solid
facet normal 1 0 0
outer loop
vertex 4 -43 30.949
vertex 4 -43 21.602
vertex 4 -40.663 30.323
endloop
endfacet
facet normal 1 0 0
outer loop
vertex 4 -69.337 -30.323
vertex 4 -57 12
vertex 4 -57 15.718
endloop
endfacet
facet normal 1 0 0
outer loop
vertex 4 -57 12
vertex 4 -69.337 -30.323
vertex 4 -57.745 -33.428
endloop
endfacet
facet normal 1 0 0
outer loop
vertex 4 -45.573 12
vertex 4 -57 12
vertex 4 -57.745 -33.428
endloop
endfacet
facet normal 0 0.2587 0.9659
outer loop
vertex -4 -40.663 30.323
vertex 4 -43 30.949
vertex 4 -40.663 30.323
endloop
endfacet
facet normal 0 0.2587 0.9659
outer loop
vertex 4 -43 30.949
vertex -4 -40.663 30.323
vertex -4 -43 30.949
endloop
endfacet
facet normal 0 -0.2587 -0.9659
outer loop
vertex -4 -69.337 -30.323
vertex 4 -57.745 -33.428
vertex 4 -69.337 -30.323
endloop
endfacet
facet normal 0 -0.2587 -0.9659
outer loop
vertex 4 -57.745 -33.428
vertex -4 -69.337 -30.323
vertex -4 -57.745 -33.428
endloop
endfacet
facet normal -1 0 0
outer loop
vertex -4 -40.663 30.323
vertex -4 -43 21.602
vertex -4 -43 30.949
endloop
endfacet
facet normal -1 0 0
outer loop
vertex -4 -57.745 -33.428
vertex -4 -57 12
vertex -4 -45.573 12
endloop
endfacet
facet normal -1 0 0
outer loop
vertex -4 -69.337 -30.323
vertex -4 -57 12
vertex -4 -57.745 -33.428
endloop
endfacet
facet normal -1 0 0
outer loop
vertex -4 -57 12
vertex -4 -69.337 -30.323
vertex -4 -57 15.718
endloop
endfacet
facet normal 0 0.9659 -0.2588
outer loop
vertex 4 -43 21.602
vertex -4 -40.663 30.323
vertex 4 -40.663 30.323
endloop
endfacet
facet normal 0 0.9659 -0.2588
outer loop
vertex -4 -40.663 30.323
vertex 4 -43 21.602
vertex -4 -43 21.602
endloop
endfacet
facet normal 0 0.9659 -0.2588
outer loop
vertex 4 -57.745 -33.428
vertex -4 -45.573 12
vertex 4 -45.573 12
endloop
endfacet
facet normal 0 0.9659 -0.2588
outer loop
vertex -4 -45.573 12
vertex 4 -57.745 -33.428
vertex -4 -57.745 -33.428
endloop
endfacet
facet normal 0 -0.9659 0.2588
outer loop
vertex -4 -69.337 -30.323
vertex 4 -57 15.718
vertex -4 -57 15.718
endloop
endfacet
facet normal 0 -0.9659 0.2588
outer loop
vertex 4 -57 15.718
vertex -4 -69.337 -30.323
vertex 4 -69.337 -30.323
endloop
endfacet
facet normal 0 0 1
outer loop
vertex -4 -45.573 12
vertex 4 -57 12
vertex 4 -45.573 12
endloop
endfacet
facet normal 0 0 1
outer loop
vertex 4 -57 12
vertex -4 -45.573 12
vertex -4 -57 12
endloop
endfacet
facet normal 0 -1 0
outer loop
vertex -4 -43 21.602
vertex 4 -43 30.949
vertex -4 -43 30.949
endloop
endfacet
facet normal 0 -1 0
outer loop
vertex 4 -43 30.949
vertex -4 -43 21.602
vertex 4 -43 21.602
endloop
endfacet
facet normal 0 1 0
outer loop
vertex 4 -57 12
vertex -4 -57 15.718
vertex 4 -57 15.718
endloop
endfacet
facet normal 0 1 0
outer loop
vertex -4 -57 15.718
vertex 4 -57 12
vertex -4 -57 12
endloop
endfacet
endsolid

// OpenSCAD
// Yin-Yang Phone Stand — DUAL COLOR
// File 1/2: Yin (dark) half — e.g. black PLA
// File 2/2: yinyang_yang.scad (light half)
// P2S Combo AMS: slot 1 = black, slot 2 = white
// 0.2mm, 4 walls, 20% infill, no supports

D        = 110;   // Disc diameter
THICK    = 12;    // Stand thickness
ANGLE    = 75;    // Phone lean angle
BASE_D   = 90;
BASE_H   = 6;
SLOT_W   = 8;     // Phone slot width (fits most cases)
SLOT_D   = 12;

module yinyang_half() {
    // Classic yin-yang: half circle + two small circles
    rotate_extrude(angle = 180, $fn = 80)
        translate([D/4, 0])
            circle(r = D/4, $fn = 60);
    // Small dot (opposite color inclusion)
    translate([0, D/4, 0])
        cylinder(d = D/4, h = THICK, $fn = 40);
    // Hollow dot for white inclusion
    difference() {
        translate([0, -D/4, 0])
            cylinder(d = D/4, h = THICK, $fn = 40);
        translate([0, -D/4, -1])
            cylinder(d = D/8, h = THICK + 2, $fn = 30);
    }
}

module stand_base() {
    difference() {
        cylinder(d = BASE_D, h = BASE_H, $fn = 60);
        // Weight-saving pocket
        translate([0, 0, BASE_H/2])
            cylinder(d = BASE_D - 16, h = BASE_H, $fn = 60);
    }
}

module phone_slot() {
    translate([-SLOT_W/2, -D/2 - 2, THICK])
        cube([SLOT_W, SLOT_D + 2, 50]);
}

difference() {
    union() {
        linear_extrude(THICK) yinyang_half();
        // Lean-back post
        translate([0, -D/2, 0])
            rotate([-( 90 - ANGLE), 0, 0])
                cube([SLOT_W, THICK, D * 0.6], center = true);
    }
    phone_slot();
}
